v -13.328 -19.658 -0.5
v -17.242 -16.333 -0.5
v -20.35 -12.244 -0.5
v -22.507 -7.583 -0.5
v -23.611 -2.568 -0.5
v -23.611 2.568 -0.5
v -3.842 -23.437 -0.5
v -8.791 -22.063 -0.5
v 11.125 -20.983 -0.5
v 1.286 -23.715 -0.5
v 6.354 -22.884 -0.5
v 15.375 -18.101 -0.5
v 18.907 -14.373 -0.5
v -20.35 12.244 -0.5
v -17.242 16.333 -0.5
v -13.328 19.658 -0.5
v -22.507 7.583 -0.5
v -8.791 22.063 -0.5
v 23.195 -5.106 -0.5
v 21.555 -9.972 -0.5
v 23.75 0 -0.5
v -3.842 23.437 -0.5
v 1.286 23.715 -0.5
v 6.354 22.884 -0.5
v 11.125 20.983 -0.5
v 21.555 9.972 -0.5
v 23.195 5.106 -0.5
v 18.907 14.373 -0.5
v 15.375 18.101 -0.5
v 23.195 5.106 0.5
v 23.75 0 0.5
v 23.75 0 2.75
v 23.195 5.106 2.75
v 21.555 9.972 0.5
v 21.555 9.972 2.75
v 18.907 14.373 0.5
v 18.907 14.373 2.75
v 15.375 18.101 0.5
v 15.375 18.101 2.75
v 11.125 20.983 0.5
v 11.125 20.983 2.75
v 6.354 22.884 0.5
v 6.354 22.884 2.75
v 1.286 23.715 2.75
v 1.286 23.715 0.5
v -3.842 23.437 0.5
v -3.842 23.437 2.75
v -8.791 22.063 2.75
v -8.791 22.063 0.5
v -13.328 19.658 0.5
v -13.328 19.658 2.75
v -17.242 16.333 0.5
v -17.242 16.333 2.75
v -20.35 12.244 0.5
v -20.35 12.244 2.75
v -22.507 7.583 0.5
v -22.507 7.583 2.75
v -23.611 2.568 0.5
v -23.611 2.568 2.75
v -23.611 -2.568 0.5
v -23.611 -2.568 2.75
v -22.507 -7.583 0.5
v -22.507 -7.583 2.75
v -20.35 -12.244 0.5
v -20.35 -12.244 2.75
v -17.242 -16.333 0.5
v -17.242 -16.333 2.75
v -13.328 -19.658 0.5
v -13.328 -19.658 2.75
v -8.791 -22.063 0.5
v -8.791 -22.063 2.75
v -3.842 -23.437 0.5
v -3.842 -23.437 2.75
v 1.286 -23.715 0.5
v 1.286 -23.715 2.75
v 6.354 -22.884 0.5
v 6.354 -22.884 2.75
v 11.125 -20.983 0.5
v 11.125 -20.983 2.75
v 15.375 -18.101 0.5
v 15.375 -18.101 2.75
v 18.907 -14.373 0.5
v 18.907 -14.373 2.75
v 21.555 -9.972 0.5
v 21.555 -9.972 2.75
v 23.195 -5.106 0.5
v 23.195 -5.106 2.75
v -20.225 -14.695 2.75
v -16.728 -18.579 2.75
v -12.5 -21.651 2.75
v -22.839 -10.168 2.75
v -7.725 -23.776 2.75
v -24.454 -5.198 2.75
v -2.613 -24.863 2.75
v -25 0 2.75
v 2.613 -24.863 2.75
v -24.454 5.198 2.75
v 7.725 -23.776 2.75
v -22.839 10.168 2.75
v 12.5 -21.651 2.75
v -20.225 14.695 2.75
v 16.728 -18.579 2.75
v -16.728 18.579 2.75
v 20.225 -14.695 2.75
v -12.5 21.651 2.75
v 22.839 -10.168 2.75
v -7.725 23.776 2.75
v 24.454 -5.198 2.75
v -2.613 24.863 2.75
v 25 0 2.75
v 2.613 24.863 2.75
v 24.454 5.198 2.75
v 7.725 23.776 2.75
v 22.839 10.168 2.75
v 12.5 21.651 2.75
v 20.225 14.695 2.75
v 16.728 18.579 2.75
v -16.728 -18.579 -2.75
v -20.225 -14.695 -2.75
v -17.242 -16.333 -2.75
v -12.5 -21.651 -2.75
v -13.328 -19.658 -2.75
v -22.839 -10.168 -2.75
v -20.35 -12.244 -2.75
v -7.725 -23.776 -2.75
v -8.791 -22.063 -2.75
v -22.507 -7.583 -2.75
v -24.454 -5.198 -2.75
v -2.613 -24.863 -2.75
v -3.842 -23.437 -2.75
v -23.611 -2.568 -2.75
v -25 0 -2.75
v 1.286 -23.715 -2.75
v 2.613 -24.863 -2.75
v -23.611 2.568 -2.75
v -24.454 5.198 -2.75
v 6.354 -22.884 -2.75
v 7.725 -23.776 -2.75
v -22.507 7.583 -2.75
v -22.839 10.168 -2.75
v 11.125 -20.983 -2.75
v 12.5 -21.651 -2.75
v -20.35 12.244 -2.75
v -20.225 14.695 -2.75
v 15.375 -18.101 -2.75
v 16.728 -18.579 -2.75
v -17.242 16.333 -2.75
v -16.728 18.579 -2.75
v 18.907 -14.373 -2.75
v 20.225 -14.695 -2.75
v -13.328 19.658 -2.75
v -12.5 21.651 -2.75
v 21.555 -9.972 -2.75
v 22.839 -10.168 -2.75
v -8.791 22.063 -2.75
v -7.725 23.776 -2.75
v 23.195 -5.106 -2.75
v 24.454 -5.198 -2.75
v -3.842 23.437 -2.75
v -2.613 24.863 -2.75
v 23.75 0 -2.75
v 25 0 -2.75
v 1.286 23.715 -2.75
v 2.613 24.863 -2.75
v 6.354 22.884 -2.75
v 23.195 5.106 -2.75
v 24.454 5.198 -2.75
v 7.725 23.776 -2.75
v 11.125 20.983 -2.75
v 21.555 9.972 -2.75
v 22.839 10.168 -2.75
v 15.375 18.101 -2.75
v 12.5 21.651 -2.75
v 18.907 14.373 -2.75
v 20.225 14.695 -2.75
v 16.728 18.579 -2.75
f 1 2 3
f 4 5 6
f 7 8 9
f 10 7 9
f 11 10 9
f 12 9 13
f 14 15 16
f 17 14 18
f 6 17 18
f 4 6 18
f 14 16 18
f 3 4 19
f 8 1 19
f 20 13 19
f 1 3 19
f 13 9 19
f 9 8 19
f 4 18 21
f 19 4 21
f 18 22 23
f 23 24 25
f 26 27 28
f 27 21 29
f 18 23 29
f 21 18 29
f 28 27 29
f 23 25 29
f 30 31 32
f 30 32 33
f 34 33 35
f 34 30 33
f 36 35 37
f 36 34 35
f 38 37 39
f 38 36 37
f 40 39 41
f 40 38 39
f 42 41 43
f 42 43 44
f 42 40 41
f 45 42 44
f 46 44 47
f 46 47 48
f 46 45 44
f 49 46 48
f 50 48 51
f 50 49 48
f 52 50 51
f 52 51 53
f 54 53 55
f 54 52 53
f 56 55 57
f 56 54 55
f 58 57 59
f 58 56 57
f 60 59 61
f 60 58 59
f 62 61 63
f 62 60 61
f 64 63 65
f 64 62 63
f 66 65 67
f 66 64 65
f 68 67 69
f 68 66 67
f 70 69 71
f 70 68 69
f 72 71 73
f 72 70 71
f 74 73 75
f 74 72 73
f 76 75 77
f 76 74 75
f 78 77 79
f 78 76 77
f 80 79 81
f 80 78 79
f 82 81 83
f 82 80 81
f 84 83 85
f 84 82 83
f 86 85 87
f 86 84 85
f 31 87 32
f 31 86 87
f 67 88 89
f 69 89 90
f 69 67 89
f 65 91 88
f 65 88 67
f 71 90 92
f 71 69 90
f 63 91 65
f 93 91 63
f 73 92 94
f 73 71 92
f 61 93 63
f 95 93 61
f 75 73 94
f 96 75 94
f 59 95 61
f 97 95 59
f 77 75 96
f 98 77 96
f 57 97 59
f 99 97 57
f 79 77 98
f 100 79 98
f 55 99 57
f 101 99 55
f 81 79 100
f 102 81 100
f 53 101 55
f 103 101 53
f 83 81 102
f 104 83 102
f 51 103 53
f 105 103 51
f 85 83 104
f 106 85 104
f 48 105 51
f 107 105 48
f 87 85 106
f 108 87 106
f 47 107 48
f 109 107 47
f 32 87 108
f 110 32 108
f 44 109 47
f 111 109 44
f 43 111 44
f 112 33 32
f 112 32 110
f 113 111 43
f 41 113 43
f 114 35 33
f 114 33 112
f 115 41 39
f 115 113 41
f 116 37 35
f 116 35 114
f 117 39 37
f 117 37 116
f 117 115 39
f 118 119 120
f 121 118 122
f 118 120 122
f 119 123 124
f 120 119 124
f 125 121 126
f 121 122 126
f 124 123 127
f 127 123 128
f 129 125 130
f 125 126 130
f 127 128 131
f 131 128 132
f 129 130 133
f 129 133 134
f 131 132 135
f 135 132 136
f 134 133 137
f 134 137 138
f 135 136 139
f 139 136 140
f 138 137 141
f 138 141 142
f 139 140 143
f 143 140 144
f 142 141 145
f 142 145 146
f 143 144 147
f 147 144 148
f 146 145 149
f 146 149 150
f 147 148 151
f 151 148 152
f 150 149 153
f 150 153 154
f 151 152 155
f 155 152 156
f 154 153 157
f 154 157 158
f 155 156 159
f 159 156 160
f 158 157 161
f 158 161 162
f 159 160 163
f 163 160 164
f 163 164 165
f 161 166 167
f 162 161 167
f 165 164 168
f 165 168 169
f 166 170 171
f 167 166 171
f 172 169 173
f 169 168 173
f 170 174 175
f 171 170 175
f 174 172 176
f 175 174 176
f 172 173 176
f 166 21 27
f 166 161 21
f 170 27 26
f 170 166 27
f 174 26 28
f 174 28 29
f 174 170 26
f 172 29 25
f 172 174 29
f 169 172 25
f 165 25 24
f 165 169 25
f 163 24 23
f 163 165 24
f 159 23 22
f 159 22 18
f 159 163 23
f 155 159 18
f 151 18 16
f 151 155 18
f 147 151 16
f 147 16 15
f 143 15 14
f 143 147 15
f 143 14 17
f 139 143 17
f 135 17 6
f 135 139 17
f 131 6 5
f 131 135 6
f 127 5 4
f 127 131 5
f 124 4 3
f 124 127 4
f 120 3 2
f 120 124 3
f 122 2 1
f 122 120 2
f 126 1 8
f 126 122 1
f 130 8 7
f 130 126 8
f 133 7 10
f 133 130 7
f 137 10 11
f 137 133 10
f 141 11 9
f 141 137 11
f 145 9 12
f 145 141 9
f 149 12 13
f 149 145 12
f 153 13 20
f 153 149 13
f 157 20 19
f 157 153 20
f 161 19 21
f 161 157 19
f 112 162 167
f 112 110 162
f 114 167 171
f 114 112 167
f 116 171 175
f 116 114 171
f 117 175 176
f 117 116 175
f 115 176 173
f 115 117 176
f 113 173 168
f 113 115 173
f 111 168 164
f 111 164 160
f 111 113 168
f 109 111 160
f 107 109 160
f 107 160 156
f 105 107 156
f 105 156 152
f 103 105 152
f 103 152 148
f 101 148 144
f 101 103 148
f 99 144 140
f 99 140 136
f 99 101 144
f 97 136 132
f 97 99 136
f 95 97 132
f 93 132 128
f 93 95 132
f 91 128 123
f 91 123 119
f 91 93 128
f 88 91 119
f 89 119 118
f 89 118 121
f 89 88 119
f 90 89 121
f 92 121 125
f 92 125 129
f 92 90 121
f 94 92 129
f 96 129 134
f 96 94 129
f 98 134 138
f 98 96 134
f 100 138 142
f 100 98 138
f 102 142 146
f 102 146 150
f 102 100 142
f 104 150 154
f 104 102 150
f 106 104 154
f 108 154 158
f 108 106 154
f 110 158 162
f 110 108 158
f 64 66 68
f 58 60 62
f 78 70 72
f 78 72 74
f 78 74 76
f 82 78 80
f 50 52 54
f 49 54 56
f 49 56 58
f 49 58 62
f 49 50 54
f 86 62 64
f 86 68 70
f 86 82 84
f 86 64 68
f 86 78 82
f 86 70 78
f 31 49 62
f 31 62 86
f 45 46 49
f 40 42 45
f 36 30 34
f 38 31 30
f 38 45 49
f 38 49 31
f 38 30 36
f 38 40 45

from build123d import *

# Parameters (mm, degrees)
SKETCH1_R           = 25
SKETCH1_R_2         = 23.75
BOSS_EXTRUDE1_DEPTH = 2.75
SKETCH2_R           = 23.75
BOSS_EXTRUDE2_DEPTH = 0.5


with BuildPart() as part:
    # Sketch1 → Boss-Extrude1 (new body, symmetric)
    with BuildSketch(Plane.XY):
        Circle(SKETCH1_R)
        Circle(SKETCH1_R_2, mode=Mode.SUBTRACT)
    extrude(amount=BOSS_EXTRUDE1_DEPTH, both=True)

    # Sketch2 → Boss-Extrude2 (add, symmetric)
    with BuildSketch(Plane.XY):
        Circle(SKETCH2_R)
    extrude(amount=BOSS_EXTRUDE2_DEPTH, both=True)


solid = part.part
